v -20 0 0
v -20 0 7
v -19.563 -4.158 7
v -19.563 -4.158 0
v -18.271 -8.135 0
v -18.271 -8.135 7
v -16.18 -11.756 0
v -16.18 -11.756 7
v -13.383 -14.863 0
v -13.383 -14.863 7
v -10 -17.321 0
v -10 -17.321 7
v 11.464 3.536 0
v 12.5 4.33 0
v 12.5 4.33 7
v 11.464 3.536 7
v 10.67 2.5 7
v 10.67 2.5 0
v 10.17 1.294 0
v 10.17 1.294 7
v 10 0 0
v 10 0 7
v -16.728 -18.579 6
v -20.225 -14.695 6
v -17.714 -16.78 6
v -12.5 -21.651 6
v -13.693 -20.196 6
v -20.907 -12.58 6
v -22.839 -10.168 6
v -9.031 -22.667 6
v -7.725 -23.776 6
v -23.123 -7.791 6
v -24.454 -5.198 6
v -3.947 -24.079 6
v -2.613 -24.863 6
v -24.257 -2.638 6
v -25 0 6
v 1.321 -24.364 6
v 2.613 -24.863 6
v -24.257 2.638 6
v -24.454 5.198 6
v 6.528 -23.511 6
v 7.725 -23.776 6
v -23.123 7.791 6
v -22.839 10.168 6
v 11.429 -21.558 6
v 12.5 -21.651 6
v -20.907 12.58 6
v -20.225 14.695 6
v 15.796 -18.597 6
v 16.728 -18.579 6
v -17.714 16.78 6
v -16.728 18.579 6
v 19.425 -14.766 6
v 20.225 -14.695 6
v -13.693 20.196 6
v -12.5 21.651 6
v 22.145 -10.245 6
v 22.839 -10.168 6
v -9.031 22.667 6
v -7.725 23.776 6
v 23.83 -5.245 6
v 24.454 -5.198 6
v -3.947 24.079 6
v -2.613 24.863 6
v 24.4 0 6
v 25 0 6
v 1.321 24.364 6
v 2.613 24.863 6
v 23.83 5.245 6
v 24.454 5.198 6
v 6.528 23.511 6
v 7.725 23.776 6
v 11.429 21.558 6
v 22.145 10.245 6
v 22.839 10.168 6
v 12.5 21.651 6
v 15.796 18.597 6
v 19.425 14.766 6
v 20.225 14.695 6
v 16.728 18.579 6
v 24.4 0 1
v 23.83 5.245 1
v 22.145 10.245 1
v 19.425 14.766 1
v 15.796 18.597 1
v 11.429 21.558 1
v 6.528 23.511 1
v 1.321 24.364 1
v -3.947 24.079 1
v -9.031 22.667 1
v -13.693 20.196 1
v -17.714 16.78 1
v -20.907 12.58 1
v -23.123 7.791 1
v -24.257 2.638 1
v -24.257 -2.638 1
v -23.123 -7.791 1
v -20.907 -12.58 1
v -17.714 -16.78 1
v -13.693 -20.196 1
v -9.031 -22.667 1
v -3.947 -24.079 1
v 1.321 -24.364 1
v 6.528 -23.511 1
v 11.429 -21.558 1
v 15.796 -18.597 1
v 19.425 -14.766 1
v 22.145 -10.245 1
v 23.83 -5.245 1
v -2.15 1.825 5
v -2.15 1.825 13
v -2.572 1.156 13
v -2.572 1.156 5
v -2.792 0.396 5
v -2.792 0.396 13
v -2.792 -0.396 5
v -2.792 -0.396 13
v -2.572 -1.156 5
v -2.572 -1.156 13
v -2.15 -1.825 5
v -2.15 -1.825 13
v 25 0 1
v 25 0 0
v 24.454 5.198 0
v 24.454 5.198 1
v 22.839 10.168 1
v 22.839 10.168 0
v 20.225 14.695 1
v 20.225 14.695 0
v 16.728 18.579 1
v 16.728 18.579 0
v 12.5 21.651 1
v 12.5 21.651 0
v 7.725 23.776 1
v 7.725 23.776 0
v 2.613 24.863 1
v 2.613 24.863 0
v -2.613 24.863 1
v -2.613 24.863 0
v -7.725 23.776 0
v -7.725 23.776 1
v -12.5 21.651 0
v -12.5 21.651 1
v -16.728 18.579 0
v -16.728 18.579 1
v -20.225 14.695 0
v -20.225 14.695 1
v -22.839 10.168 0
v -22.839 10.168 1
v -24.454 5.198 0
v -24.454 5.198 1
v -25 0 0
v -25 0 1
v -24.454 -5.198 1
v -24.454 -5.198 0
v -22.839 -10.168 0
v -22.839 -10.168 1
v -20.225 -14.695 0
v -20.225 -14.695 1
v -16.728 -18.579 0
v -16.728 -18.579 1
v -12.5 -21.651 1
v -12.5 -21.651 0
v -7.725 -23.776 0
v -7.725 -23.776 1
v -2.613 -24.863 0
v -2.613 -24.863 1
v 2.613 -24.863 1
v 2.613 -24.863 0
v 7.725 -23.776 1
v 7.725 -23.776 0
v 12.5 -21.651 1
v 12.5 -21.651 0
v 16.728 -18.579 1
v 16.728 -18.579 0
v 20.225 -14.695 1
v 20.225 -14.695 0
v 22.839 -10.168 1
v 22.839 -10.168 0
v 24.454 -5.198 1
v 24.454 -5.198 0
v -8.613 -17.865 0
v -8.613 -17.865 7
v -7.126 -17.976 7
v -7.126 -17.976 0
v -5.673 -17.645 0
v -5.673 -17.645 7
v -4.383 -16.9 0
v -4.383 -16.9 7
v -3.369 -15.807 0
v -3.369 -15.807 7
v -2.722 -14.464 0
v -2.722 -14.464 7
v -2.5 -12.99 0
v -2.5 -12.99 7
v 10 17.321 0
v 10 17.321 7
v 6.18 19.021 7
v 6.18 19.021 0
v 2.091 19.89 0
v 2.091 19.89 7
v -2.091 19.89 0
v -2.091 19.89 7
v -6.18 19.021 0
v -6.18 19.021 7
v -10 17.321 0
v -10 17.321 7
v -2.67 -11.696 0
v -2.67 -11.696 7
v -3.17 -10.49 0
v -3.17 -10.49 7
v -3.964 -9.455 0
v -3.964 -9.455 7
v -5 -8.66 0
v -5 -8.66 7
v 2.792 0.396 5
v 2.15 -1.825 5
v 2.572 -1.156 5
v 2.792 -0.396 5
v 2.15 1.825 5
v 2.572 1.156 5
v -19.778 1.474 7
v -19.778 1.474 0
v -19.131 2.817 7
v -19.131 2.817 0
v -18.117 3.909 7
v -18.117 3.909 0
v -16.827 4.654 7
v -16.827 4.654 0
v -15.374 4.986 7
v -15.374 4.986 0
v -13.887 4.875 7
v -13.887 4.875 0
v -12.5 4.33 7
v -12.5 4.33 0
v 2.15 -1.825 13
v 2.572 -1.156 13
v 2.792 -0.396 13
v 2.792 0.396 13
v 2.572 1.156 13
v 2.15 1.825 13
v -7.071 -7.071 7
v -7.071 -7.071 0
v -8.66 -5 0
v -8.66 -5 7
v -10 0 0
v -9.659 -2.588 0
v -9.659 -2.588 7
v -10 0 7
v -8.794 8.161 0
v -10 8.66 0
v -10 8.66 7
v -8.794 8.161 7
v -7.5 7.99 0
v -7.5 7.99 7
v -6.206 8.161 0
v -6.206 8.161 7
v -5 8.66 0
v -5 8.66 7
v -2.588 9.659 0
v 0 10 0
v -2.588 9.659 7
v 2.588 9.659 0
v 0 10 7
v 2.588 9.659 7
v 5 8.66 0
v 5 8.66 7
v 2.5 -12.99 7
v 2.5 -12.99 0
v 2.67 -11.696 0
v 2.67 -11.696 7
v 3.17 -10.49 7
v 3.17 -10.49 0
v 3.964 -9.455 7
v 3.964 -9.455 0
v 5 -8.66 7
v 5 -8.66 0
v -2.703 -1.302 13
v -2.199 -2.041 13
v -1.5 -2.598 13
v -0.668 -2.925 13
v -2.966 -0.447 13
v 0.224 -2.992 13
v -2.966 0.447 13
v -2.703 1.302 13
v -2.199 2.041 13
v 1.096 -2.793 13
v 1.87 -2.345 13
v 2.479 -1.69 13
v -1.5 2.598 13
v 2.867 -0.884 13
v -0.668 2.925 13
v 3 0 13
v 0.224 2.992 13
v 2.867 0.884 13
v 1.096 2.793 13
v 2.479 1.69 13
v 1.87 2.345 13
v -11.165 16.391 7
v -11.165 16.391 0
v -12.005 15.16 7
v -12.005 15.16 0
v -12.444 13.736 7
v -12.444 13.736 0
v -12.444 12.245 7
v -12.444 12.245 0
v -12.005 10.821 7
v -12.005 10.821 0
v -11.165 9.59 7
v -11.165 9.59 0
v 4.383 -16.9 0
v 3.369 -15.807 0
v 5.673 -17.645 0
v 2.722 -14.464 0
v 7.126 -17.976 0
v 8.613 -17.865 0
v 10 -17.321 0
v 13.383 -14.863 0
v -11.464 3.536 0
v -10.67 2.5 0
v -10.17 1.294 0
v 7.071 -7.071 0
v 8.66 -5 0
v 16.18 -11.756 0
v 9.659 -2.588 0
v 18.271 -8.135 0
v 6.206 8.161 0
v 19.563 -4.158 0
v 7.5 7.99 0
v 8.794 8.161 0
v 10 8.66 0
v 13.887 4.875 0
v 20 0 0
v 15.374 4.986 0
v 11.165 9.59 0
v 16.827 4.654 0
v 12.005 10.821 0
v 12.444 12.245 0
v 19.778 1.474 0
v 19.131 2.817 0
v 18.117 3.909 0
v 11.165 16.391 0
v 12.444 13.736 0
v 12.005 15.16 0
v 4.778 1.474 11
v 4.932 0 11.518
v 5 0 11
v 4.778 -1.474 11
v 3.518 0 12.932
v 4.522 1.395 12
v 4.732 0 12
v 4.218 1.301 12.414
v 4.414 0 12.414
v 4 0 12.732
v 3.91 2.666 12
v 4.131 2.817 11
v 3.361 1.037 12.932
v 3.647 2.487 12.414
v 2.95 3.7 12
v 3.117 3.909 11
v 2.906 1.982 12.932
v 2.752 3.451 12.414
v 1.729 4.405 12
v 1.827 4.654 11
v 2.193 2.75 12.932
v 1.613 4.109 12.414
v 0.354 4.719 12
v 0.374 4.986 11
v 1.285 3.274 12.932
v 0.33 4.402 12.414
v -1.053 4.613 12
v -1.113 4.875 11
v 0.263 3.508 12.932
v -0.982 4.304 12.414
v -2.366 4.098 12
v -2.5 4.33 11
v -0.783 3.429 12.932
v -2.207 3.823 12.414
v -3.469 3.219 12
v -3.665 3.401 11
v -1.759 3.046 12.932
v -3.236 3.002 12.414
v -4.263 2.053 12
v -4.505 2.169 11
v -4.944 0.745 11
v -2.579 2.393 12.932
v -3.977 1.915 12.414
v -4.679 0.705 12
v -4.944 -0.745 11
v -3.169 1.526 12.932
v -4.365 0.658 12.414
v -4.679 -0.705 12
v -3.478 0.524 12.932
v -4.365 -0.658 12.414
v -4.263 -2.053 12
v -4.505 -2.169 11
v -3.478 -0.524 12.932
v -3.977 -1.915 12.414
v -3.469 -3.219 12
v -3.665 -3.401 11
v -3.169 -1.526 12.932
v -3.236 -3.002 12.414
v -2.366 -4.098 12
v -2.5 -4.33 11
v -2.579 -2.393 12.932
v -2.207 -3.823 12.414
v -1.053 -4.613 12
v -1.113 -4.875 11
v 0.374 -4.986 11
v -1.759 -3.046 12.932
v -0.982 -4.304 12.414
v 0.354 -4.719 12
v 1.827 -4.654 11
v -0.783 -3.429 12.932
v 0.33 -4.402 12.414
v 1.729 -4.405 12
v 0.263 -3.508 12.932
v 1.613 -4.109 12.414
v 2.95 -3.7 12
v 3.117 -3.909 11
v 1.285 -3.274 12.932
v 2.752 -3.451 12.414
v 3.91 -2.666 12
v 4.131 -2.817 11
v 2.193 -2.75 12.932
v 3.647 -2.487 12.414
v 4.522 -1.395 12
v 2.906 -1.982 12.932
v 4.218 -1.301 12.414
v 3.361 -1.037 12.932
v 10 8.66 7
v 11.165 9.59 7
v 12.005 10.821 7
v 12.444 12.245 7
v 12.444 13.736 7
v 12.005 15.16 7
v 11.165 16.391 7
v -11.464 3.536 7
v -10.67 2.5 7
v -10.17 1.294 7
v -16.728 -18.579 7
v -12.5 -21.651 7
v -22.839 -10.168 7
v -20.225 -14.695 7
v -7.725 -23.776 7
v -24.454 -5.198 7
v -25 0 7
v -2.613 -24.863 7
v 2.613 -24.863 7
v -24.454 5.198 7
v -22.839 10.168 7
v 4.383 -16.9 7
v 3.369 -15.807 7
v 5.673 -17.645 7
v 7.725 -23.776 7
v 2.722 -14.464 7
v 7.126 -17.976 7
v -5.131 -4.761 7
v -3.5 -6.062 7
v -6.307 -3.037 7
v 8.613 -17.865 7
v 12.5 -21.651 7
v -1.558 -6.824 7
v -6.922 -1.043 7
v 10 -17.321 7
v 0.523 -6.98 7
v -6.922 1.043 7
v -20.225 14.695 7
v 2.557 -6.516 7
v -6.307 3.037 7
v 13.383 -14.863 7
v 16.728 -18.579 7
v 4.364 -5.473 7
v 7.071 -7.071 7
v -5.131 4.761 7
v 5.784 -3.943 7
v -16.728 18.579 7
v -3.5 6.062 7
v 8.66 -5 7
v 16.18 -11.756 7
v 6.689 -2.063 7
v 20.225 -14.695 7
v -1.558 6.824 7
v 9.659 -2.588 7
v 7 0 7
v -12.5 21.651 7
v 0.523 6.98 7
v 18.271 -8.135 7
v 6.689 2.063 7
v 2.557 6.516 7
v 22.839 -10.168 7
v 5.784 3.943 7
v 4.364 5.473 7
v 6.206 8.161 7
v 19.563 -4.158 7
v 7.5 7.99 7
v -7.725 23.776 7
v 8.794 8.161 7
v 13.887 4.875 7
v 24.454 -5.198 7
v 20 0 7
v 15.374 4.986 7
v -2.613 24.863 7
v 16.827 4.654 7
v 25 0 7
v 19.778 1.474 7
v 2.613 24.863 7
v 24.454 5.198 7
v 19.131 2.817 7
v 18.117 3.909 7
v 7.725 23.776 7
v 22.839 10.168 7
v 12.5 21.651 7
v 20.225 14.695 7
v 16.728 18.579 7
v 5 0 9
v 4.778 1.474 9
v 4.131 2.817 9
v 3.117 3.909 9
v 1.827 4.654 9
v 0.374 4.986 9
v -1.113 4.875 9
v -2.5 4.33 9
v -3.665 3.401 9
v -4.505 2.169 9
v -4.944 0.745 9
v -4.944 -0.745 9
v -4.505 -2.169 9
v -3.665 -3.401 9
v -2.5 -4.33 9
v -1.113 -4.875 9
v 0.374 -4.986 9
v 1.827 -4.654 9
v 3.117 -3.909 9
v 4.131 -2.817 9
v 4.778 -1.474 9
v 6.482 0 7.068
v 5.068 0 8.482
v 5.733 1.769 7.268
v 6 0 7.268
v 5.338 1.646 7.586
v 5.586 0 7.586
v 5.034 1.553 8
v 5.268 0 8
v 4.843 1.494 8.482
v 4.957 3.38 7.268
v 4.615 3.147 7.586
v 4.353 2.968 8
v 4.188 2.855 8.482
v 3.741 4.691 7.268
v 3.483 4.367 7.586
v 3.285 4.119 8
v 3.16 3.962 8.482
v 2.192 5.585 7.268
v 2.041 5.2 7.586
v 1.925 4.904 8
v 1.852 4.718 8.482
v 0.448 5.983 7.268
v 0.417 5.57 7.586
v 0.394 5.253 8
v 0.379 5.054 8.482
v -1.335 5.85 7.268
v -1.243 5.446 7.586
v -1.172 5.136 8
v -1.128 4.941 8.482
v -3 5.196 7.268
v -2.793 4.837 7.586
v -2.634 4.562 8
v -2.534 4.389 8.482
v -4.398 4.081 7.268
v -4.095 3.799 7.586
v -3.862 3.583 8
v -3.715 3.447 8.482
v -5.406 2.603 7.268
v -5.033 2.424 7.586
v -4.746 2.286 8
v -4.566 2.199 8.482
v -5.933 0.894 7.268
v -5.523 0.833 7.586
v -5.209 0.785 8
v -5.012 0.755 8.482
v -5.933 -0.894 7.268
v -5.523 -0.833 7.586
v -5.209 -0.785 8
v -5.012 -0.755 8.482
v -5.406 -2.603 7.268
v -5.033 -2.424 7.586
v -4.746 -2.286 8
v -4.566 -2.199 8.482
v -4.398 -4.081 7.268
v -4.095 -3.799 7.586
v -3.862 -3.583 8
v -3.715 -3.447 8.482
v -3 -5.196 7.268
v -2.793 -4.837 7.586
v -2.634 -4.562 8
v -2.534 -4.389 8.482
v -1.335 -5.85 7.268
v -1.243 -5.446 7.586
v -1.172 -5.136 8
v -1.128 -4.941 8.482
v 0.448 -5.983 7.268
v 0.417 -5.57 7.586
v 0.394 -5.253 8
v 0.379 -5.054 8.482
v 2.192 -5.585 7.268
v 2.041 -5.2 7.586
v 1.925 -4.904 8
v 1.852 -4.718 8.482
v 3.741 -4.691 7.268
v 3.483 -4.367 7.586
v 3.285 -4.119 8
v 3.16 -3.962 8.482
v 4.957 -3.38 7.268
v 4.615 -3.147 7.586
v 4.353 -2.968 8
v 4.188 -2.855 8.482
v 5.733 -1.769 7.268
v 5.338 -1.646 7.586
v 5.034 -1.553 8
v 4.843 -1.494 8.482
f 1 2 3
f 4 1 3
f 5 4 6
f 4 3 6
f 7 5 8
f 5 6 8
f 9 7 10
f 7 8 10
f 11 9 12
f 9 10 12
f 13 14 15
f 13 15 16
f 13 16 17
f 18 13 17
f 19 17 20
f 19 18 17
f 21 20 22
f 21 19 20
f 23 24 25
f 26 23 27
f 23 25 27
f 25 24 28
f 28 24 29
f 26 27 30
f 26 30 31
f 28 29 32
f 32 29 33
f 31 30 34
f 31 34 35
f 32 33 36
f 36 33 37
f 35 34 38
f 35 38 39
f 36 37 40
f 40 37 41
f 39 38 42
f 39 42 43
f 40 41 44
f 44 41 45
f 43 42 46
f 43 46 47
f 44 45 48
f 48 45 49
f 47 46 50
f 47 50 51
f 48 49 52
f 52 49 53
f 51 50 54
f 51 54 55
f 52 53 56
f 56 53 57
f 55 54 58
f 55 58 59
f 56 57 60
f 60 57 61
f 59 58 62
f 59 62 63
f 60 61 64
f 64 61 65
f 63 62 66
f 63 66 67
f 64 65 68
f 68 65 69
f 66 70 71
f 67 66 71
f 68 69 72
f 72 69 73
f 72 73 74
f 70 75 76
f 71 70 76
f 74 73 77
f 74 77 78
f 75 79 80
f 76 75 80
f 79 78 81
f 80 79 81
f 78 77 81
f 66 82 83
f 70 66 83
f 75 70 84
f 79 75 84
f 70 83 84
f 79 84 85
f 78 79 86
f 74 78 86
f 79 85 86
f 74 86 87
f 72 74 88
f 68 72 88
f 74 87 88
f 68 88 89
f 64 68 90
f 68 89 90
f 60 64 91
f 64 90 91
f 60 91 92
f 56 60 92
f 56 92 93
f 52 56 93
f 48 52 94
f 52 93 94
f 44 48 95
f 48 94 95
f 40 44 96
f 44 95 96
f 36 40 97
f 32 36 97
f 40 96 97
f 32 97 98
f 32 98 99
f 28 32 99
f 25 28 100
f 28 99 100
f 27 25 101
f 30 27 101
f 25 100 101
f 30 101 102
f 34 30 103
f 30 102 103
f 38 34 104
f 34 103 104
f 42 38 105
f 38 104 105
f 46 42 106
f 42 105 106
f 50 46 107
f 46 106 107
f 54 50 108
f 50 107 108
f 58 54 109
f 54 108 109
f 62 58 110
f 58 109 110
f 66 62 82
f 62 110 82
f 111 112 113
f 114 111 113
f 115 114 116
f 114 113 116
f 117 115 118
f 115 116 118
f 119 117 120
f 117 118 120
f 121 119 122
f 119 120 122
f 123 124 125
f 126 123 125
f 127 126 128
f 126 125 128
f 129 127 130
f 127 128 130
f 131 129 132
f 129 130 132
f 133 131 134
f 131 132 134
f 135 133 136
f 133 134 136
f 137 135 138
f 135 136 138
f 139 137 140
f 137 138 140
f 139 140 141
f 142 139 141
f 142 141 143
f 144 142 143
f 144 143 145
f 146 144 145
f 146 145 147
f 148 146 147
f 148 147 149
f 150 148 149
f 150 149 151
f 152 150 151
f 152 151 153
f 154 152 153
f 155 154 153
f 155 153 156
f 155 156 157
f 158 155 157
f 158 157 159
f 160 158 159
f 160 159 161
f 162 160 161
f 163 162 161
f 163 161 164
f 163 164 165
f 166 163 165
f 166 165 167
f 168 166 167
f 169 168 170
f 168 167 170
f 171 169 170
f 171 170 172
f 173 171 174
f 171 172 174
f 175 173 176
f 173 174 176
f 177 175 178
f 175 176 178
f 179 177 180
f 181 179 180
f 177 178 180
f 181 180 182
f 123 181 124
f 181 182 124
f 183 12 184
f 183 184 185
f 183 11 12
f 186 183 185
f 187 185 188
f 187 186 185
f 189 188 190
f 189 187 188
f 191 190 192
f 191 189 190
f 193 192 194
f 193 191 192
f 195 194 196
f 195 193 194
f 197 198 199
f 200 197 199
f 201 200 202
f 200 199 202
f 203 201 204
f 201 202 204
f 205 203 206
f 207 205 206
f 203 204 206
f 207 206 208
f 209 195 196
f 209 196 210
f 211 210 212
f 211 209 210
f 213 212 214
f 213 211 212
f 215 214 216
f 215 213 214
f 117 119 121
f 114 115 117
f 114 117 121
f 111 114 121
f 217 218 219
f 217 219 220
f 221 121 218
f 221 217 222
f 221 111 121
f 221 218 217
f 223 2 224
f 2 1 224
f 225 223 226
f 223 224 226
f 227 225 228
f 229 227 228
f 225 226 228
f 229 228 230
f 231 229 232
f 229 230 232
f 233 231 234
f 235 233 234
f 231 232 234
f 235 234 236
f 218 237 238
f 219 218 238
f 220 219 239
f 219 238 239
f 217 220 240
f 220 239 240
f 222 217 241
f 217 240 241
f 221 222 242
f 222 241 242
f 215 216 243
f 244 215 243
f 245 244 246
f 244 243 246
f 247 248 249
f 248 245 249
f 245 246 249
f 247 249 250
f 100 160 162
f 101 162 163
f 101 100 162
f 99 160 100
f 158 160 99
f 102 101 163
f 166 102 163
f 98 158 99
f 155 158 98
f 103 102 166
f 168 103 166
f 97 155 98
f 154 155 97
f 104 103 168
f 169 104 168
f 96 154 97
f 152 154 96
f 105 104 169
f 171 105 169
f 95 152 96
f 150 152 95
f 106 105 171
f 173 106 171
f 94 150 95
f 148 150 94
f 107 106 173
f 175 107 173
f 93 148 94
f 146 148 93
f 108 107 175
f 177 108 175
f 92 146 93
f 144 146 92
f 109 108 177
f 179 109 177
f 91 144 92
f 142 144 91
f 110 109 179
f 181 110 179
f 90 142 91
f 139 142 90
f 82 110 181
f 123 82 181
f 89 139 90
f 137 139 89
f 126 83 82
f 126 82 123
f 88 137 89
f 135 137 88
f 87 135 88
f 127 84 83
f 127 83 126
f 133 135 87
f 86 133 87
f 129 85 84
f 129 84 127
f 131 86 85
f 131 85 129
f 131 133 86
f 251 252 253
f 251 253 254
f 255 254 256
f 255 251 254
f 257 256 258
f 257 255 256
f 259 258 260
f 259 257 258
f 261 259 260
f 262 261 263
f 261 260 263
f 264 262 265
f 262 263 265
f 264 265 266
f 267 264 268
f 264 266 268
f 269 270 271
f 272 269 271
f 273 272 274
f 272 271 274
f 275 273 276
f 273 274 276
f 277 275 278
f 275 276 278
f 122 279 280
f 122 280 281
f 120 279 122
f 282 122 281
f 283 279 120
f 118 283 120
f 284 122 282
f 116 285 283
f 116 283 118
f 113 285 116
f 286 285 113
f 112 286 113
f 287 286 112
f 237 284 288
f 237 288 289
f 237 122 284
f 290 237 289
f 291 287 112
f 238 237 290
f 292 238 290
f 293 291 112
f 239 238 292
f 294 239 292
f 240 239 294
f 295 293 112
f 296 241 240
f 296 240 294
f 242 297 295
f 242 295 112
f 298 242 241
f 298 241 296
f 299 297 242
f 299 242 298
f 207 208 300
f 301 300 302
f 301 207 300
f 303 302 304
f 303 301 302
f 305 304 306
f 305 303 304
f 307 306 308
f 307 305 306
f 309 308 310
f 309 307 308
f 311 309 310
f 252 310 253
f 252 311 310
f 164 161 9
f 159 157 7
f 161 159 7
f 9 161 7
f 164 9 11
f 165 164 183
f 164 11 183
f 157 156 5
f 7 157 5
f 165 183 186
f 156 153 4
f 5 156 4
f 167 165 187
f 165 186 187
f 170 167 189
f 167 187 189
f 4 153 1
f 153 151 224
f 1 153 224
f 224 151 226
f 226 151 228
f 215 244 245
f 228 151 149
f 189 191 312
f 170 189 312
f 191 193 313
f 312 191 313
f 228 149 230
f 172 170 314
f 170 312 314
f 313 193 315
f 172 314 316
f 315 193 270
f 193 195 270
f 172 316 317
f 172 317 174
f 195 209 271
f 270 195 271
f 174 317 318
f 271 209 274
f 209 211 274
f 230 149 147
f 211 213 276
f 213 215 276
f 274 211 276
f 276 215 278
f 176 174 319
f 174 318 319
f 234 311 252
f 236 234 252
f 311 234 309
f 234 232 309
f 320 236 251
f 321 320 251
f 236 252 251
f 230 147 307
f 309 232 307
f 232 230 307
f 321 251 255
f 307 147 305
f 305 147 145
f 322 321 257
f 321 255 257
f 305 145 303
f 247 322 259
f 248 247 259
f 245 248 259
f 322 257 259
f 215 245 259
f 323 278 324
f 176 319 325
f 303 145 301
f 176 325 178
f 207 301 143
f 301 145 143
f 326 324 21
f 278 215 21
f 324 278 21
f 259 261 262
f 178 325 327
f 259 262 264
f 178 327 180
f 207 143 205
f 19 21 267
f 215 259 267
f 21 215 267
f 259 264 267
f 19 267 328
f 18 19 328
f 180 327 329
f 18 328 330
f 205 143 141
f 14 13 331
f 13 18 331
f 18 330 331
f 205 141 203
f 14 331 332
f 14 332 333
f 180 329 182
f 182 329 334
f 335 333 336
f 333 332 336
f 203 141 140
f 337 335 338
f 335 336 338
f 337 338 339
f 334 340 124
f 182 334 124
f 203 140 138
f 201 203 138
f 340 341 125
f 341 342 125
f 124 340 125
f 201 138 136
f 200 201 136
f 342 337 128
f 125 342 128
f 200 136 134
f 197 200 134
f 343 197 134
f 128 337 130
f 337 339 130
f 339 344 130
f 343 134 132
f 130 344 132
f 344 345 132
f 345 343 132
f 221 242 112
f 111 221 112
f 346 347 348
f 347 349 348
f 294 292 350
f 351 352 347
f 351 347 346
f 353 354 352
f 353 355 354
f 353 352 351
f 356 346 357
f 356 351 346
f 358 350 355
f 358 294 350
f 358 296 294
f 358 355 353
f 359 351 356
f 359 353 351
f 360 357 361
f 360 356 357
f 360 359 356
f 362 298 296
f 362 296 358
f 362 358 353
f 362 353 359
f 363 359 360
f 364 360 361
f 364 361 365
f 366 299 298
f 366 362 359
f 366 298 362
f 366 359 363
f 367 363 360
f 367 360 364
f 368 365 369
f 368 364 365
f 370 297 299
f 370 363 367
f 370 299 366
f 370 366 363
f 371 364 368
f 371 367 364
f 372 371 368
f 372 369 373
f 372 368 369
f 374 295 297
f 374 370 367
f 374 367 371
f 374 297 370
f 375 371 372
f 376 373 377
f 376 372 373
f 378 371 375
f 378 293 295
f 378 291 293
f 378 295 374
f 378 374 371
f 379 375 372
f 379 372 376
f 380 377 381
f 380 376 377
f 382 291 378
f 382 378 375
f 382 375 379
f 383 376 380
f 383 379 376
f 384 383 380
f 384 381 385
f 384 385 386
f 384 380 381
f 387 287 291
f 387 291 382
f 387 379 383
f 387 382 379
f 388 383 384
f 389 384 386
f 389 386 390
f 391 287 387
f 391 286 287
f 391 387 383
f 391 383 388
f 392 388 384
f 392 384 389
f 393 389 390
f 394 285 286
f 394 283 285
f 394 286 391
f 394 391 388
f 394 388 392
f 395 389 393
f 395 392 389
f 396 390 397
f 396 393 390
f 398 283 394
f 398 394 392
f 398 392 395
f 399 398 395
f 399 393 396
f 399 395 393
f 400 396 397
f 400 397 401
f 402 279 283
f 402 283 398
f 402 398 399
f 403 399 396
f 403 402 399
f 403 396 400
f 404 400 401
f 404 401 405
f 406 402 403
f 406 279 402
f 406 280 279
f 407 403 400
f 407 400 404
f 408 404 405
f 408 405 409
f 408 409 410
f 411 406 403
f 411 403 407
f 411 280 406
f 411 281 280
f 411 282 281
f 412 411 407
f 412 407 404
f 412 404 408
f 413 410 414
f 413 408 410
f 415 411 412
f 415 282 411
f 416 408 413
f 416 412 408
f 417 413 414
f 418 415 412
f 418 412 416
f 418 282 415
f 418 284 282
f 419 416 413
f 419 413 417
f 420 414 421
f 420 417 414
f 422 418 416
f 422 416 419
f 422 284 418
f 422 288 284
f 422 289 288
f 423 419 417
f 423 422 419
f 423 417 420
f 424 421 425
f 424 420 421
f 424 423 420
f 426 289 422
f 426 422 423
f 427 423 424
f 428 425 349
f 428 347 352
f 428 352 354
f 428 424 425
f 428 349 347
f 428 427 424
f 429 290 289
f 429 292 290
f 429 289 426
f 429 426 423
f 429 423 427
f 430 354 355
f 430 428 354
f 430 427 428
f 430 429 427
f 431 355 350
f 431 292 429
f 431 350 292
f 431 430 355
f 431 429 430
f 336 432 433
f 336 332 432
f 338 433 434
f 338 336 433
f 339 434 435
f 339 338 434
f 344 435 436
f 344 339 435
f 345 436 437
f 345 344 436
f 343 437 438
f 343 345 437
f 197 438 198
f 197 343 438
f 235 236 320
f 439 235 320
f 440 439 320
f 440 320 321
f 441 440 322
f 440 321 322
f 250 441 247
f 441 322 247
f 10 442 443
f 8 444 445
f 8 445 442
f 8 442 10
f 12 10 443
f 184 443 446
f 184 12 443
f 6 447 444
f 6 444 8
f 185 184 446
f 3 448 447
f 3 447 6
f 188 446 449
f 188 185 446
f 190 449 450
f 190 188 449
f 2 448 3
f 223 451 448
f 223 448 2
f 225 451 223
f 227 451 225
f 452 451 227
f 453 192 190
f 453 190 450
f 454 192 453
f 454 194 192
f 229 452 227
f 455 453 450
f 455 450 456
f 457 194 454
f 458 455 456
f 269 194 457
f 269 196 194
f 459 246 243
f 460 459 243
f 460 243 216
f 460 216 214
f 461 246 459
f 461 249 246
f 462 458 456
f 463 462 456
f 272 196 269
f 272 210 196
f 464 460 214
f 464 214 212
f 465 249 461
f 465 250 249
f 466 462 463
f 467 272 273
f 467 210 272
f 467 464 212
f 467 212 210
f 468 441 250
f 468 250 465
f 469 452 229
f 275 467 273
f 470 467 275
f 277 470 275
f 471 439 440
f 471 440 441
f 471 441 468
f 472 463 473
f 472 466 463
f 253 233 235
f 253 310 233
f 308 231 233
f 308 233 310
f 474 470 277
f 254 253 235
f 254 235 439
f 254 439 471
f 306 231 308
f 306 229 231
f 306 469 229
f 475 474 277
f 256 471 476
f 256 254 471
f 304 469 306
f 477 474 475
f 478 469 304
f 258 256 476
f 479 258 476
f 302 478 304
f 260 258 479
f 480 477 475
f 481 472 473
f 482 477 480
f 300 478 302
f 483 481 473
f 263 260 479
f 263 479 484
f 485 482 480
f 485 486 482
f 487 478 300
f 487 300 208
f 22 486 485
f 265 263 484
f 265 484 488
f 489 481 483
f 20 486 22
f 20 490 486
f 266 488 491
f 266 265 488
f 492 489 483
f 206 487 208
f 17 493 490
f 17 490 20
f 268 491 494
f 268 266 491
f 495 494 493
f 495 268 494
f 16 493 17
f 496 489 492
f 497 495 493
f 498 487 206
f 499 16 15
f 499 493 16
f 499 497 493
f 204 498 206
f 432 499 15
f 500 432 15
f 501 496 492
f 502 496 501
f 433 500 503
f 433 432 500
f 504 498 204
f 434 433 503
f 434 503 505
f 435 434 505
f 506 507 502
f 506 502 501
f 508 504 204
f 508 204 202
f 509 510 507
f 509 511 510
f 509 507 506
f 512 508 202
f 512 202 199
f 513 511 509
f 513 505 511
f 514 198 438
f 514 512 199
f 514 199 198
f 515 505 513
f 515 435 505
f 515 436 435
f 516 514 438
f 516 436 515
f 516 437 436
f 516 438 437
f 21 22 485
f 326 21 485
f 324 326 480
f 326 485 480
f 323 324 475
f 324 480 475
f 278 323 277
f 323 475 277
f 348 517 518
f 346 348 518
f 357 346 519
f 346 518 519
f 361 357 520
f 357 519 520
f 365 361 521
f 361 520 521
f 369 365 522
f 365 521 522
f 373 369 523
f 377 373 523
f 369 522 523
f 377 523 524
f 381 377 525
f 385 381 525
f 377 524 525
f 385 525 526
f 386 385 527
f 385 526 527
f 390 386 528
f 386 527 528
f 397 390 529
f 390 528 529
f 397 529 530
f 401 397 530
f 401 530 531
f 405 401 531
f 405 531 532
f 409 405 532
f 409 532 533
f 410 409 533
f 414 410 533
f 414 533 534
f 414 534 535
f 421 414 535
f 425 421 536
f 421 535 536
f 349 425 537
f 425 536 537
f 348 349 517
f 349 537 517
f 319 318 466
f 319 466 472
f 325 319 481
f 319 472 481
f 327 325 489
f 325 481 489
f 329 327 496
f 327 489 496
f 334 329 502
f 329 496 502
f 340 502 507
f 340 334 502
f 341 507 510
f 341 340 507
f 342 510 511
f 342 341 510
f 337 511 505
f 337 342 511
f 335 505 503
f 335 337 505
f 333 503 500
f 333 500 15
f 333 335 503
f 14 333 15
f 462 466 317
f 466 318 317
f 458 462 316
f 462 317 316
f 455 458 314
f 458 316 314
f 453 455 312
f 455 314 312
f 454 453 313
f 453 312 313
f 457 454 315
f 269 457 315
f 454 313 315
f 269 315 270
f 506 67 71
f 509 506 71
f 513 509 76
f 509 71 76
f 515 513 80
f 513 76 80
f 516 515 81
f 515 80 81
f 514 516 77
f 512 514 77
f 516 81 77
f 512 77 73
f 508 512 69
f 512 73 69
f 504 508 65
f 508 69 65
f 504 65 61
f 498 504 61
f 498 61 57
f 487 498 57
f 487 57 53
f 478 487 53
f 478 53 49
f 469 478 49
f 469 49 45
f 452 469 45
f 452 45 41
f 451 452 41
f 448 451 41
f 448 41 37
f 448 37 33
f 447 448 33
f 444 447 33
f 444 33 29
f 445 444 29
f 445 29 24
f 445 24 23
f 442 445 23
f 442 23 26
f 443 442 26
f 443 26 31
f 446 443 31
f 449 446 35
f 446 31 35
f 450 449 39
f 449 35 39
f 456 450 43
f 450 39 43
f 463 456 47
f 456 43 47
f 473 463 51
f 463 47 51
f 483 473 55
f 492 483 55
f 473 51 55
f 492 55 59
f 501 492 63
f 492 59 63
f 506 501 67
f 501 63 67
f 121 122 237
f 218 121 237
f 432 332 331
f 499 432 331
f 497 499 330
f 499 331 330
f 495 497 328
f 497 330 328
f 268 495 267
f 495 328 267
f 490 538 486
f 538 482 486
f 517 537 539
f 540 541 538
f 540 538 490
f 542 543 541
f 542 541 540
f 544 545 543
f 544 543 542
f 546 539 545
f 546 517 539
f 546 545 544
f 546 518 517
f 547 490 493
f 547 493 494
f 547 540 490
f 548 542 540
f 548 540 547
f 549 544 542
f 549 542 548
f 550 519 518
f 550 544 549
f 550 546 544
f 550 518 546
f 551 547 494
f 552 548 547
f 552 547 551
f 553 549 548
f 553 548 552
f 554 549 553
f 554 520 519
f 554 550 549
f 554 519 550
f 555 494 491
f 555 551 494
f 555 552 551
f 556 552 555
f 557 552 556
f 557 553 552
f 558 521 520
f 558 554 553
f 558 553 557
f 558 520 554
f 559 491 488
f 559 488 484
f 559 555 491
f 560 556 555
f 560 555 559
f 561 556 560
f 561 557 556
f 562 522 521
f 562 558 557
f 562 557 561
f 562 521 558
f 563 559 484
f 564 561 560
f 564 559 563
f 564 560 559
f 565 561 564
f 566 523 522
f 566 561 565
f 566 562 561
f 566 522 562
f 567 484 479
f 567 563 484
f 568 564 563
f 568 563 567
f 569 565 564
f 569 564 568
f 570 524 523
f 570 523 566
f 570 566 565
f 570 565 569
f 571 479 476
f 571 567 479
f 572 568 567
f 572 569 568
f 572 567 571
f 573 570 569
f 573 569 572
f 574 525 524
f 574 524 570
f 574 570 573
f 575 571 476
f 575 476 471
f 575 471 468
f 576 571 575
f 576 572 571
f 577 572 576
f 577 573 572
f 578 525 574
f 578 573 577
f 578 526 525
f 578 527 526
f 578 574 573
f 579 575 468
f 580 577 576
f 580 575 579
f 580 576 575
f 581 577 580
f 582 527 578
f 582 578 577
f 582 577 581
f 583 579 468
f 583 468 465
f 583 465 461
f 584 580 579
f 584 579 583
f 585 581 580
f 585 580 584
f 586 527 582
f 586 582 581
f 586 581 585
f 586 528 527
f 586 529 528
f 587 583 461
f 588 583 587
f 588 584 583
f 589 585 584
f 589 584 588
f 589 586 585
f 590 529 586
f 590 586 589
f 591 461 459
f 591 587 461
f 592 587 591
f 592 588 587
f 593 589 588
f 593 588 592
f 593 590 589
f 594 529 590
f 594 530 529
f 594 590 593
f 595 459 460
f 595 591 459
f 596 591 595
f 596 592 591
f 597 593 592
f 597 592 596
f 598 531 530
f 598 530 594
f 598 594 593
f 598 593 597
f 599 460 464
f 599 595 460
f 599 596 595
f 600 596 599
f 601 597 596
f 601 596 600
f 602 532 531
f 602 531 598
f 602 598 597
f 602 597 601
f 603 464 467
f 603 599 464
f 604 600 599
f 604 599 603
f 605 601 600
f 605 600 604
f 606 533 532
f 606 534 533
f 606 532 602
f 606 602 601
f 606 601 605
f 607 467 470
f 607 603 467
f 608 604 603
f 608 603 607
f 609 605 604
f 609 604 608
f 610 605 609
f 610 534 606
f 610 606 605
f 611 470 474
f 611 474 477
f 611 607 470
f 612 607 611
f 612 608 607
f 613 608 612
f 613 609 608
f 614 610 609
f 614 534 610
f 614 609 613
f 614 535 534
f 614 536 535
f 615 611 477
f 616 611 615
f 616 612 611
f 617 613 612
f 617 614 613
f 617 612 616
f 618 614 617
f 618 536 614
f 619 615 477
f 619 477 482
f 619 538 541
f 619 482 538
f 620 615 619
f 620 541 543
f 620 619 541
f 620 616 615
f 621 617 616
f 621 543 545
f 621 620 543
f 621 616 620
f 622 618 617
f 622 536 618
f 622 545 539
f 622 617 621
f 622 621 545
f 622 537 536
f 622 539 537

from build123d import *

# Parameters (mm, degrees)
F0_R         = 25
F1_DEPTH     = 7
F2_R         = 5
F3_DEPTH     = 6
F5_DEPTH     = 8
F7_R         = 25
F7_R_2       = 24.4
F8_DEPTH     = 5
F10_DEPTH    = 25
F11_R        = 5
F12_T1_DEPTH = 7
F13_R        = 2


# Not quite as in the source:
# - a fillet or chamfer that OpenCascade refuses, or shapes differently, is made with other operations: its cross-section is extruded or revolved along the edge and cut away or added


with BuildPart() as f1:
    # F0 (on Top) → F1 (new body)
    with BuildSketch(Plane.XY):
        Circle(F0_R)
    extrude(amount=F1_DEPTH)

    # F2 (on face) → F3 (join)
    with BuildSketch(Plane.XY.offset(7)):
        Circle(F2_R)
    extrude(amount=F3_DEPTH)

    # F4 (on face) → F5 (cut)
    with BuildSketch(Plane.XY.offset(13)):
        with BuildLine():
            Line((2.1498313887, 1.825), (-2.1498313887, 1.825))
            ThreePointArc((-2.1498313887, 1.825), (-2.82, 0), (-2.1498313887, -1.825))
            Line((-2.1498313887, -1.825), (2.1498313887, -1.825))
            ThreePointArc((2.1498313887, -1.825), (2.82, 0), (2.1498313887, 1.825))
        make_face()
    extrude(amount=-F5_DEPTH, mode=Mode.SUBTRACT)

    # F7 (on offset) → F8 (cut)
    with BuildSketch(Plane.XY.offset(1)):
        Circle(F7_R)
        Circle(F7_R_2, mode=Mode.SUBTRACT)
    extrude(amount=F8_DEPTH, mode=Mode.SUBTRACT)

    # F9 (on face) → F10 (cut)
    with BuildSketch(Plane.XY.offset(7)):
        with BuildLine():
            Line((7.1352549156, 7.0062926922), (15.9346604169, 12.0866318271))
            ThreePointArc((15.9346604169, 12.0866318271), (0, 20.0000017881), (-15.9346604169, 12.0866318271))
            Line((-15.9346604169, 12.0866318271), (-7.1352549156, 7.0062926922))
            ThreePointArc((-7.1352549156, 7.0062926922), (0, 10), (7.1352549156, 7.0062926922))
        make_face()
        with BuildLine():
            ThreePointArc((2.5, -19.8431366353), (15.0000012666, -13.2287578225), (20.0000017881, 0))
            ThreePointArc((20.0000017881, 0), (19.6047610649, 3.9564397015), (18.4346604169, 7.7565048082))
            Line((18.4346604169, 7.7565048082), (9.6352549156, 2.6761656733))
            ThreePointArc((9.6352549156, 2.6761656733), (9.9083941473, 1.3504537837), (10, 0))
            ThreePointArc((10, 0), (7.9056941504, -6.123724357), (2.5, -9.6824583655))
            Line((2.5, -9.6824583655), (2.5, -19.8431366353))
        make_face()
        with BuildLine():
            ThreePointArc((-18.4346604169, 7.7565048082), (-17.3205096243, -10.0000008941), (-2.5, -19.8431366353))
            Line((-2.5, -19.8431366353), (-2.5, -9.6824583655))
            ThreePointArc((-2.5, -9.6824583655), (-8.6602540378, -5), (-9.6352549156, 2.6761656733))
            Line((-9.6352549156, 2.6761656733), (-18.4346604169, 7.7565048082))
        make_face()
    extrude(amount=-F10_DEPTH, mode=Mode.SUBTRACT)

    # F11
    f11_edges = [f1.edges().sort_by_distance(p)[0] for p in [
        (-18.43466, 7.756505, 3.5),
        (-15.93466, 12.086632, 3.5),
        (15.93466, 12.086632, 3.5),
        (18.43466, 7.756505, 3.5),
        (2.5, -19.843137, 3.5),
        (-2.5, -19.843137, 3.5),
    ]]
    fillet(f11_edges, radius=F11_R)

    # F12: fillet of radius 5 on 6 edges, made by hand

    # F12_s2 → F12_t1 (join)
    with BuildSketch(Plane.XY):
        with BuildLine():
            ThreePointArc((-12.5, 4.3301270189), (-10.6698729811, 2.5), (-10, 0))
            ThreePointArc((-10, 0), (-9.9083941473, 1.3504537837), (-9.6352549156, 2.6761656733))
            Line((-9.6352549156, 2.6761656733), (-12.5, 4.3301270189))
        make_face()
        with BuildLine():
            ThreePointArc((-2.5, -12.9903810568), (-3.1698729811, -10.4903810568), (-5, -8.6602540378))
            ThreePointArc((-5, -8.6602540378), (-3.7846697903, -9.2561479341), (-2.5, -9.6824583655))
            Line((-2.5, -9.6824583655), (-2.5, -12.9903810568))
        make_face()
        with BuildLine():
            ThreePointArc((2.5, -12.9903810568), (3.1698729811, -10.4903810568), (5, -8.6602540378))
            ThreePointArc((5, -8.6602540378), (3.7846697903, -9.2561479341), (2.5, -9.6824583655))
            Line((2.5, -9.6824583655), (2.5, -12.9903810568))
        make_face()
        with BuildLine():
            ThreePointArc((12.5, 4.3301270189), (10.6698729811, 2.5), (10, 0))
            ThreePointArc((10, 0), (9.9083941473, 1.3504537837), (9.6352549156, 2.6761656733))
            Line((9.6352549156, 2.6761656733), (12.5, 4.3301270189))
        make_face()
        with BuildLine():
            ThreePointArc((10, 8.6602540378), (7.5, 7.9903810568), (5, 8.6602540378))
            ThreePointArc((5, 8.6602540378), (6.123724357, 7.9056941504), (7.1352549156, 7.0062926922))
            Line((7.1352549156, 7.0062926922), (10, 8.6602540378))
        make_face()
        with BuildLine():
            ThreePointArc((-10, 8.6602540378), (-7.5, 7.9903810568), (-5, 8.6602540378))
            ThreePointArc((-5, 8.6602540378), (-6.123724357, 7.9056941504), (-7.1352549156, 7.0062926922))
            Line((-7.1352549156, 7.0062926922), (-10, 8.6602540378))
        make_face()
    extrude(amount=F12_T1_DEPTH)

    # F13
    f13_edges = [f1.edges().sort_by_distance(p)[0] for p in [
        (-5, 0, 7),
        (-5, 0, 13),
    ]]
    fillet(f13_edges, radius=F13_R)


solid = f1.part
